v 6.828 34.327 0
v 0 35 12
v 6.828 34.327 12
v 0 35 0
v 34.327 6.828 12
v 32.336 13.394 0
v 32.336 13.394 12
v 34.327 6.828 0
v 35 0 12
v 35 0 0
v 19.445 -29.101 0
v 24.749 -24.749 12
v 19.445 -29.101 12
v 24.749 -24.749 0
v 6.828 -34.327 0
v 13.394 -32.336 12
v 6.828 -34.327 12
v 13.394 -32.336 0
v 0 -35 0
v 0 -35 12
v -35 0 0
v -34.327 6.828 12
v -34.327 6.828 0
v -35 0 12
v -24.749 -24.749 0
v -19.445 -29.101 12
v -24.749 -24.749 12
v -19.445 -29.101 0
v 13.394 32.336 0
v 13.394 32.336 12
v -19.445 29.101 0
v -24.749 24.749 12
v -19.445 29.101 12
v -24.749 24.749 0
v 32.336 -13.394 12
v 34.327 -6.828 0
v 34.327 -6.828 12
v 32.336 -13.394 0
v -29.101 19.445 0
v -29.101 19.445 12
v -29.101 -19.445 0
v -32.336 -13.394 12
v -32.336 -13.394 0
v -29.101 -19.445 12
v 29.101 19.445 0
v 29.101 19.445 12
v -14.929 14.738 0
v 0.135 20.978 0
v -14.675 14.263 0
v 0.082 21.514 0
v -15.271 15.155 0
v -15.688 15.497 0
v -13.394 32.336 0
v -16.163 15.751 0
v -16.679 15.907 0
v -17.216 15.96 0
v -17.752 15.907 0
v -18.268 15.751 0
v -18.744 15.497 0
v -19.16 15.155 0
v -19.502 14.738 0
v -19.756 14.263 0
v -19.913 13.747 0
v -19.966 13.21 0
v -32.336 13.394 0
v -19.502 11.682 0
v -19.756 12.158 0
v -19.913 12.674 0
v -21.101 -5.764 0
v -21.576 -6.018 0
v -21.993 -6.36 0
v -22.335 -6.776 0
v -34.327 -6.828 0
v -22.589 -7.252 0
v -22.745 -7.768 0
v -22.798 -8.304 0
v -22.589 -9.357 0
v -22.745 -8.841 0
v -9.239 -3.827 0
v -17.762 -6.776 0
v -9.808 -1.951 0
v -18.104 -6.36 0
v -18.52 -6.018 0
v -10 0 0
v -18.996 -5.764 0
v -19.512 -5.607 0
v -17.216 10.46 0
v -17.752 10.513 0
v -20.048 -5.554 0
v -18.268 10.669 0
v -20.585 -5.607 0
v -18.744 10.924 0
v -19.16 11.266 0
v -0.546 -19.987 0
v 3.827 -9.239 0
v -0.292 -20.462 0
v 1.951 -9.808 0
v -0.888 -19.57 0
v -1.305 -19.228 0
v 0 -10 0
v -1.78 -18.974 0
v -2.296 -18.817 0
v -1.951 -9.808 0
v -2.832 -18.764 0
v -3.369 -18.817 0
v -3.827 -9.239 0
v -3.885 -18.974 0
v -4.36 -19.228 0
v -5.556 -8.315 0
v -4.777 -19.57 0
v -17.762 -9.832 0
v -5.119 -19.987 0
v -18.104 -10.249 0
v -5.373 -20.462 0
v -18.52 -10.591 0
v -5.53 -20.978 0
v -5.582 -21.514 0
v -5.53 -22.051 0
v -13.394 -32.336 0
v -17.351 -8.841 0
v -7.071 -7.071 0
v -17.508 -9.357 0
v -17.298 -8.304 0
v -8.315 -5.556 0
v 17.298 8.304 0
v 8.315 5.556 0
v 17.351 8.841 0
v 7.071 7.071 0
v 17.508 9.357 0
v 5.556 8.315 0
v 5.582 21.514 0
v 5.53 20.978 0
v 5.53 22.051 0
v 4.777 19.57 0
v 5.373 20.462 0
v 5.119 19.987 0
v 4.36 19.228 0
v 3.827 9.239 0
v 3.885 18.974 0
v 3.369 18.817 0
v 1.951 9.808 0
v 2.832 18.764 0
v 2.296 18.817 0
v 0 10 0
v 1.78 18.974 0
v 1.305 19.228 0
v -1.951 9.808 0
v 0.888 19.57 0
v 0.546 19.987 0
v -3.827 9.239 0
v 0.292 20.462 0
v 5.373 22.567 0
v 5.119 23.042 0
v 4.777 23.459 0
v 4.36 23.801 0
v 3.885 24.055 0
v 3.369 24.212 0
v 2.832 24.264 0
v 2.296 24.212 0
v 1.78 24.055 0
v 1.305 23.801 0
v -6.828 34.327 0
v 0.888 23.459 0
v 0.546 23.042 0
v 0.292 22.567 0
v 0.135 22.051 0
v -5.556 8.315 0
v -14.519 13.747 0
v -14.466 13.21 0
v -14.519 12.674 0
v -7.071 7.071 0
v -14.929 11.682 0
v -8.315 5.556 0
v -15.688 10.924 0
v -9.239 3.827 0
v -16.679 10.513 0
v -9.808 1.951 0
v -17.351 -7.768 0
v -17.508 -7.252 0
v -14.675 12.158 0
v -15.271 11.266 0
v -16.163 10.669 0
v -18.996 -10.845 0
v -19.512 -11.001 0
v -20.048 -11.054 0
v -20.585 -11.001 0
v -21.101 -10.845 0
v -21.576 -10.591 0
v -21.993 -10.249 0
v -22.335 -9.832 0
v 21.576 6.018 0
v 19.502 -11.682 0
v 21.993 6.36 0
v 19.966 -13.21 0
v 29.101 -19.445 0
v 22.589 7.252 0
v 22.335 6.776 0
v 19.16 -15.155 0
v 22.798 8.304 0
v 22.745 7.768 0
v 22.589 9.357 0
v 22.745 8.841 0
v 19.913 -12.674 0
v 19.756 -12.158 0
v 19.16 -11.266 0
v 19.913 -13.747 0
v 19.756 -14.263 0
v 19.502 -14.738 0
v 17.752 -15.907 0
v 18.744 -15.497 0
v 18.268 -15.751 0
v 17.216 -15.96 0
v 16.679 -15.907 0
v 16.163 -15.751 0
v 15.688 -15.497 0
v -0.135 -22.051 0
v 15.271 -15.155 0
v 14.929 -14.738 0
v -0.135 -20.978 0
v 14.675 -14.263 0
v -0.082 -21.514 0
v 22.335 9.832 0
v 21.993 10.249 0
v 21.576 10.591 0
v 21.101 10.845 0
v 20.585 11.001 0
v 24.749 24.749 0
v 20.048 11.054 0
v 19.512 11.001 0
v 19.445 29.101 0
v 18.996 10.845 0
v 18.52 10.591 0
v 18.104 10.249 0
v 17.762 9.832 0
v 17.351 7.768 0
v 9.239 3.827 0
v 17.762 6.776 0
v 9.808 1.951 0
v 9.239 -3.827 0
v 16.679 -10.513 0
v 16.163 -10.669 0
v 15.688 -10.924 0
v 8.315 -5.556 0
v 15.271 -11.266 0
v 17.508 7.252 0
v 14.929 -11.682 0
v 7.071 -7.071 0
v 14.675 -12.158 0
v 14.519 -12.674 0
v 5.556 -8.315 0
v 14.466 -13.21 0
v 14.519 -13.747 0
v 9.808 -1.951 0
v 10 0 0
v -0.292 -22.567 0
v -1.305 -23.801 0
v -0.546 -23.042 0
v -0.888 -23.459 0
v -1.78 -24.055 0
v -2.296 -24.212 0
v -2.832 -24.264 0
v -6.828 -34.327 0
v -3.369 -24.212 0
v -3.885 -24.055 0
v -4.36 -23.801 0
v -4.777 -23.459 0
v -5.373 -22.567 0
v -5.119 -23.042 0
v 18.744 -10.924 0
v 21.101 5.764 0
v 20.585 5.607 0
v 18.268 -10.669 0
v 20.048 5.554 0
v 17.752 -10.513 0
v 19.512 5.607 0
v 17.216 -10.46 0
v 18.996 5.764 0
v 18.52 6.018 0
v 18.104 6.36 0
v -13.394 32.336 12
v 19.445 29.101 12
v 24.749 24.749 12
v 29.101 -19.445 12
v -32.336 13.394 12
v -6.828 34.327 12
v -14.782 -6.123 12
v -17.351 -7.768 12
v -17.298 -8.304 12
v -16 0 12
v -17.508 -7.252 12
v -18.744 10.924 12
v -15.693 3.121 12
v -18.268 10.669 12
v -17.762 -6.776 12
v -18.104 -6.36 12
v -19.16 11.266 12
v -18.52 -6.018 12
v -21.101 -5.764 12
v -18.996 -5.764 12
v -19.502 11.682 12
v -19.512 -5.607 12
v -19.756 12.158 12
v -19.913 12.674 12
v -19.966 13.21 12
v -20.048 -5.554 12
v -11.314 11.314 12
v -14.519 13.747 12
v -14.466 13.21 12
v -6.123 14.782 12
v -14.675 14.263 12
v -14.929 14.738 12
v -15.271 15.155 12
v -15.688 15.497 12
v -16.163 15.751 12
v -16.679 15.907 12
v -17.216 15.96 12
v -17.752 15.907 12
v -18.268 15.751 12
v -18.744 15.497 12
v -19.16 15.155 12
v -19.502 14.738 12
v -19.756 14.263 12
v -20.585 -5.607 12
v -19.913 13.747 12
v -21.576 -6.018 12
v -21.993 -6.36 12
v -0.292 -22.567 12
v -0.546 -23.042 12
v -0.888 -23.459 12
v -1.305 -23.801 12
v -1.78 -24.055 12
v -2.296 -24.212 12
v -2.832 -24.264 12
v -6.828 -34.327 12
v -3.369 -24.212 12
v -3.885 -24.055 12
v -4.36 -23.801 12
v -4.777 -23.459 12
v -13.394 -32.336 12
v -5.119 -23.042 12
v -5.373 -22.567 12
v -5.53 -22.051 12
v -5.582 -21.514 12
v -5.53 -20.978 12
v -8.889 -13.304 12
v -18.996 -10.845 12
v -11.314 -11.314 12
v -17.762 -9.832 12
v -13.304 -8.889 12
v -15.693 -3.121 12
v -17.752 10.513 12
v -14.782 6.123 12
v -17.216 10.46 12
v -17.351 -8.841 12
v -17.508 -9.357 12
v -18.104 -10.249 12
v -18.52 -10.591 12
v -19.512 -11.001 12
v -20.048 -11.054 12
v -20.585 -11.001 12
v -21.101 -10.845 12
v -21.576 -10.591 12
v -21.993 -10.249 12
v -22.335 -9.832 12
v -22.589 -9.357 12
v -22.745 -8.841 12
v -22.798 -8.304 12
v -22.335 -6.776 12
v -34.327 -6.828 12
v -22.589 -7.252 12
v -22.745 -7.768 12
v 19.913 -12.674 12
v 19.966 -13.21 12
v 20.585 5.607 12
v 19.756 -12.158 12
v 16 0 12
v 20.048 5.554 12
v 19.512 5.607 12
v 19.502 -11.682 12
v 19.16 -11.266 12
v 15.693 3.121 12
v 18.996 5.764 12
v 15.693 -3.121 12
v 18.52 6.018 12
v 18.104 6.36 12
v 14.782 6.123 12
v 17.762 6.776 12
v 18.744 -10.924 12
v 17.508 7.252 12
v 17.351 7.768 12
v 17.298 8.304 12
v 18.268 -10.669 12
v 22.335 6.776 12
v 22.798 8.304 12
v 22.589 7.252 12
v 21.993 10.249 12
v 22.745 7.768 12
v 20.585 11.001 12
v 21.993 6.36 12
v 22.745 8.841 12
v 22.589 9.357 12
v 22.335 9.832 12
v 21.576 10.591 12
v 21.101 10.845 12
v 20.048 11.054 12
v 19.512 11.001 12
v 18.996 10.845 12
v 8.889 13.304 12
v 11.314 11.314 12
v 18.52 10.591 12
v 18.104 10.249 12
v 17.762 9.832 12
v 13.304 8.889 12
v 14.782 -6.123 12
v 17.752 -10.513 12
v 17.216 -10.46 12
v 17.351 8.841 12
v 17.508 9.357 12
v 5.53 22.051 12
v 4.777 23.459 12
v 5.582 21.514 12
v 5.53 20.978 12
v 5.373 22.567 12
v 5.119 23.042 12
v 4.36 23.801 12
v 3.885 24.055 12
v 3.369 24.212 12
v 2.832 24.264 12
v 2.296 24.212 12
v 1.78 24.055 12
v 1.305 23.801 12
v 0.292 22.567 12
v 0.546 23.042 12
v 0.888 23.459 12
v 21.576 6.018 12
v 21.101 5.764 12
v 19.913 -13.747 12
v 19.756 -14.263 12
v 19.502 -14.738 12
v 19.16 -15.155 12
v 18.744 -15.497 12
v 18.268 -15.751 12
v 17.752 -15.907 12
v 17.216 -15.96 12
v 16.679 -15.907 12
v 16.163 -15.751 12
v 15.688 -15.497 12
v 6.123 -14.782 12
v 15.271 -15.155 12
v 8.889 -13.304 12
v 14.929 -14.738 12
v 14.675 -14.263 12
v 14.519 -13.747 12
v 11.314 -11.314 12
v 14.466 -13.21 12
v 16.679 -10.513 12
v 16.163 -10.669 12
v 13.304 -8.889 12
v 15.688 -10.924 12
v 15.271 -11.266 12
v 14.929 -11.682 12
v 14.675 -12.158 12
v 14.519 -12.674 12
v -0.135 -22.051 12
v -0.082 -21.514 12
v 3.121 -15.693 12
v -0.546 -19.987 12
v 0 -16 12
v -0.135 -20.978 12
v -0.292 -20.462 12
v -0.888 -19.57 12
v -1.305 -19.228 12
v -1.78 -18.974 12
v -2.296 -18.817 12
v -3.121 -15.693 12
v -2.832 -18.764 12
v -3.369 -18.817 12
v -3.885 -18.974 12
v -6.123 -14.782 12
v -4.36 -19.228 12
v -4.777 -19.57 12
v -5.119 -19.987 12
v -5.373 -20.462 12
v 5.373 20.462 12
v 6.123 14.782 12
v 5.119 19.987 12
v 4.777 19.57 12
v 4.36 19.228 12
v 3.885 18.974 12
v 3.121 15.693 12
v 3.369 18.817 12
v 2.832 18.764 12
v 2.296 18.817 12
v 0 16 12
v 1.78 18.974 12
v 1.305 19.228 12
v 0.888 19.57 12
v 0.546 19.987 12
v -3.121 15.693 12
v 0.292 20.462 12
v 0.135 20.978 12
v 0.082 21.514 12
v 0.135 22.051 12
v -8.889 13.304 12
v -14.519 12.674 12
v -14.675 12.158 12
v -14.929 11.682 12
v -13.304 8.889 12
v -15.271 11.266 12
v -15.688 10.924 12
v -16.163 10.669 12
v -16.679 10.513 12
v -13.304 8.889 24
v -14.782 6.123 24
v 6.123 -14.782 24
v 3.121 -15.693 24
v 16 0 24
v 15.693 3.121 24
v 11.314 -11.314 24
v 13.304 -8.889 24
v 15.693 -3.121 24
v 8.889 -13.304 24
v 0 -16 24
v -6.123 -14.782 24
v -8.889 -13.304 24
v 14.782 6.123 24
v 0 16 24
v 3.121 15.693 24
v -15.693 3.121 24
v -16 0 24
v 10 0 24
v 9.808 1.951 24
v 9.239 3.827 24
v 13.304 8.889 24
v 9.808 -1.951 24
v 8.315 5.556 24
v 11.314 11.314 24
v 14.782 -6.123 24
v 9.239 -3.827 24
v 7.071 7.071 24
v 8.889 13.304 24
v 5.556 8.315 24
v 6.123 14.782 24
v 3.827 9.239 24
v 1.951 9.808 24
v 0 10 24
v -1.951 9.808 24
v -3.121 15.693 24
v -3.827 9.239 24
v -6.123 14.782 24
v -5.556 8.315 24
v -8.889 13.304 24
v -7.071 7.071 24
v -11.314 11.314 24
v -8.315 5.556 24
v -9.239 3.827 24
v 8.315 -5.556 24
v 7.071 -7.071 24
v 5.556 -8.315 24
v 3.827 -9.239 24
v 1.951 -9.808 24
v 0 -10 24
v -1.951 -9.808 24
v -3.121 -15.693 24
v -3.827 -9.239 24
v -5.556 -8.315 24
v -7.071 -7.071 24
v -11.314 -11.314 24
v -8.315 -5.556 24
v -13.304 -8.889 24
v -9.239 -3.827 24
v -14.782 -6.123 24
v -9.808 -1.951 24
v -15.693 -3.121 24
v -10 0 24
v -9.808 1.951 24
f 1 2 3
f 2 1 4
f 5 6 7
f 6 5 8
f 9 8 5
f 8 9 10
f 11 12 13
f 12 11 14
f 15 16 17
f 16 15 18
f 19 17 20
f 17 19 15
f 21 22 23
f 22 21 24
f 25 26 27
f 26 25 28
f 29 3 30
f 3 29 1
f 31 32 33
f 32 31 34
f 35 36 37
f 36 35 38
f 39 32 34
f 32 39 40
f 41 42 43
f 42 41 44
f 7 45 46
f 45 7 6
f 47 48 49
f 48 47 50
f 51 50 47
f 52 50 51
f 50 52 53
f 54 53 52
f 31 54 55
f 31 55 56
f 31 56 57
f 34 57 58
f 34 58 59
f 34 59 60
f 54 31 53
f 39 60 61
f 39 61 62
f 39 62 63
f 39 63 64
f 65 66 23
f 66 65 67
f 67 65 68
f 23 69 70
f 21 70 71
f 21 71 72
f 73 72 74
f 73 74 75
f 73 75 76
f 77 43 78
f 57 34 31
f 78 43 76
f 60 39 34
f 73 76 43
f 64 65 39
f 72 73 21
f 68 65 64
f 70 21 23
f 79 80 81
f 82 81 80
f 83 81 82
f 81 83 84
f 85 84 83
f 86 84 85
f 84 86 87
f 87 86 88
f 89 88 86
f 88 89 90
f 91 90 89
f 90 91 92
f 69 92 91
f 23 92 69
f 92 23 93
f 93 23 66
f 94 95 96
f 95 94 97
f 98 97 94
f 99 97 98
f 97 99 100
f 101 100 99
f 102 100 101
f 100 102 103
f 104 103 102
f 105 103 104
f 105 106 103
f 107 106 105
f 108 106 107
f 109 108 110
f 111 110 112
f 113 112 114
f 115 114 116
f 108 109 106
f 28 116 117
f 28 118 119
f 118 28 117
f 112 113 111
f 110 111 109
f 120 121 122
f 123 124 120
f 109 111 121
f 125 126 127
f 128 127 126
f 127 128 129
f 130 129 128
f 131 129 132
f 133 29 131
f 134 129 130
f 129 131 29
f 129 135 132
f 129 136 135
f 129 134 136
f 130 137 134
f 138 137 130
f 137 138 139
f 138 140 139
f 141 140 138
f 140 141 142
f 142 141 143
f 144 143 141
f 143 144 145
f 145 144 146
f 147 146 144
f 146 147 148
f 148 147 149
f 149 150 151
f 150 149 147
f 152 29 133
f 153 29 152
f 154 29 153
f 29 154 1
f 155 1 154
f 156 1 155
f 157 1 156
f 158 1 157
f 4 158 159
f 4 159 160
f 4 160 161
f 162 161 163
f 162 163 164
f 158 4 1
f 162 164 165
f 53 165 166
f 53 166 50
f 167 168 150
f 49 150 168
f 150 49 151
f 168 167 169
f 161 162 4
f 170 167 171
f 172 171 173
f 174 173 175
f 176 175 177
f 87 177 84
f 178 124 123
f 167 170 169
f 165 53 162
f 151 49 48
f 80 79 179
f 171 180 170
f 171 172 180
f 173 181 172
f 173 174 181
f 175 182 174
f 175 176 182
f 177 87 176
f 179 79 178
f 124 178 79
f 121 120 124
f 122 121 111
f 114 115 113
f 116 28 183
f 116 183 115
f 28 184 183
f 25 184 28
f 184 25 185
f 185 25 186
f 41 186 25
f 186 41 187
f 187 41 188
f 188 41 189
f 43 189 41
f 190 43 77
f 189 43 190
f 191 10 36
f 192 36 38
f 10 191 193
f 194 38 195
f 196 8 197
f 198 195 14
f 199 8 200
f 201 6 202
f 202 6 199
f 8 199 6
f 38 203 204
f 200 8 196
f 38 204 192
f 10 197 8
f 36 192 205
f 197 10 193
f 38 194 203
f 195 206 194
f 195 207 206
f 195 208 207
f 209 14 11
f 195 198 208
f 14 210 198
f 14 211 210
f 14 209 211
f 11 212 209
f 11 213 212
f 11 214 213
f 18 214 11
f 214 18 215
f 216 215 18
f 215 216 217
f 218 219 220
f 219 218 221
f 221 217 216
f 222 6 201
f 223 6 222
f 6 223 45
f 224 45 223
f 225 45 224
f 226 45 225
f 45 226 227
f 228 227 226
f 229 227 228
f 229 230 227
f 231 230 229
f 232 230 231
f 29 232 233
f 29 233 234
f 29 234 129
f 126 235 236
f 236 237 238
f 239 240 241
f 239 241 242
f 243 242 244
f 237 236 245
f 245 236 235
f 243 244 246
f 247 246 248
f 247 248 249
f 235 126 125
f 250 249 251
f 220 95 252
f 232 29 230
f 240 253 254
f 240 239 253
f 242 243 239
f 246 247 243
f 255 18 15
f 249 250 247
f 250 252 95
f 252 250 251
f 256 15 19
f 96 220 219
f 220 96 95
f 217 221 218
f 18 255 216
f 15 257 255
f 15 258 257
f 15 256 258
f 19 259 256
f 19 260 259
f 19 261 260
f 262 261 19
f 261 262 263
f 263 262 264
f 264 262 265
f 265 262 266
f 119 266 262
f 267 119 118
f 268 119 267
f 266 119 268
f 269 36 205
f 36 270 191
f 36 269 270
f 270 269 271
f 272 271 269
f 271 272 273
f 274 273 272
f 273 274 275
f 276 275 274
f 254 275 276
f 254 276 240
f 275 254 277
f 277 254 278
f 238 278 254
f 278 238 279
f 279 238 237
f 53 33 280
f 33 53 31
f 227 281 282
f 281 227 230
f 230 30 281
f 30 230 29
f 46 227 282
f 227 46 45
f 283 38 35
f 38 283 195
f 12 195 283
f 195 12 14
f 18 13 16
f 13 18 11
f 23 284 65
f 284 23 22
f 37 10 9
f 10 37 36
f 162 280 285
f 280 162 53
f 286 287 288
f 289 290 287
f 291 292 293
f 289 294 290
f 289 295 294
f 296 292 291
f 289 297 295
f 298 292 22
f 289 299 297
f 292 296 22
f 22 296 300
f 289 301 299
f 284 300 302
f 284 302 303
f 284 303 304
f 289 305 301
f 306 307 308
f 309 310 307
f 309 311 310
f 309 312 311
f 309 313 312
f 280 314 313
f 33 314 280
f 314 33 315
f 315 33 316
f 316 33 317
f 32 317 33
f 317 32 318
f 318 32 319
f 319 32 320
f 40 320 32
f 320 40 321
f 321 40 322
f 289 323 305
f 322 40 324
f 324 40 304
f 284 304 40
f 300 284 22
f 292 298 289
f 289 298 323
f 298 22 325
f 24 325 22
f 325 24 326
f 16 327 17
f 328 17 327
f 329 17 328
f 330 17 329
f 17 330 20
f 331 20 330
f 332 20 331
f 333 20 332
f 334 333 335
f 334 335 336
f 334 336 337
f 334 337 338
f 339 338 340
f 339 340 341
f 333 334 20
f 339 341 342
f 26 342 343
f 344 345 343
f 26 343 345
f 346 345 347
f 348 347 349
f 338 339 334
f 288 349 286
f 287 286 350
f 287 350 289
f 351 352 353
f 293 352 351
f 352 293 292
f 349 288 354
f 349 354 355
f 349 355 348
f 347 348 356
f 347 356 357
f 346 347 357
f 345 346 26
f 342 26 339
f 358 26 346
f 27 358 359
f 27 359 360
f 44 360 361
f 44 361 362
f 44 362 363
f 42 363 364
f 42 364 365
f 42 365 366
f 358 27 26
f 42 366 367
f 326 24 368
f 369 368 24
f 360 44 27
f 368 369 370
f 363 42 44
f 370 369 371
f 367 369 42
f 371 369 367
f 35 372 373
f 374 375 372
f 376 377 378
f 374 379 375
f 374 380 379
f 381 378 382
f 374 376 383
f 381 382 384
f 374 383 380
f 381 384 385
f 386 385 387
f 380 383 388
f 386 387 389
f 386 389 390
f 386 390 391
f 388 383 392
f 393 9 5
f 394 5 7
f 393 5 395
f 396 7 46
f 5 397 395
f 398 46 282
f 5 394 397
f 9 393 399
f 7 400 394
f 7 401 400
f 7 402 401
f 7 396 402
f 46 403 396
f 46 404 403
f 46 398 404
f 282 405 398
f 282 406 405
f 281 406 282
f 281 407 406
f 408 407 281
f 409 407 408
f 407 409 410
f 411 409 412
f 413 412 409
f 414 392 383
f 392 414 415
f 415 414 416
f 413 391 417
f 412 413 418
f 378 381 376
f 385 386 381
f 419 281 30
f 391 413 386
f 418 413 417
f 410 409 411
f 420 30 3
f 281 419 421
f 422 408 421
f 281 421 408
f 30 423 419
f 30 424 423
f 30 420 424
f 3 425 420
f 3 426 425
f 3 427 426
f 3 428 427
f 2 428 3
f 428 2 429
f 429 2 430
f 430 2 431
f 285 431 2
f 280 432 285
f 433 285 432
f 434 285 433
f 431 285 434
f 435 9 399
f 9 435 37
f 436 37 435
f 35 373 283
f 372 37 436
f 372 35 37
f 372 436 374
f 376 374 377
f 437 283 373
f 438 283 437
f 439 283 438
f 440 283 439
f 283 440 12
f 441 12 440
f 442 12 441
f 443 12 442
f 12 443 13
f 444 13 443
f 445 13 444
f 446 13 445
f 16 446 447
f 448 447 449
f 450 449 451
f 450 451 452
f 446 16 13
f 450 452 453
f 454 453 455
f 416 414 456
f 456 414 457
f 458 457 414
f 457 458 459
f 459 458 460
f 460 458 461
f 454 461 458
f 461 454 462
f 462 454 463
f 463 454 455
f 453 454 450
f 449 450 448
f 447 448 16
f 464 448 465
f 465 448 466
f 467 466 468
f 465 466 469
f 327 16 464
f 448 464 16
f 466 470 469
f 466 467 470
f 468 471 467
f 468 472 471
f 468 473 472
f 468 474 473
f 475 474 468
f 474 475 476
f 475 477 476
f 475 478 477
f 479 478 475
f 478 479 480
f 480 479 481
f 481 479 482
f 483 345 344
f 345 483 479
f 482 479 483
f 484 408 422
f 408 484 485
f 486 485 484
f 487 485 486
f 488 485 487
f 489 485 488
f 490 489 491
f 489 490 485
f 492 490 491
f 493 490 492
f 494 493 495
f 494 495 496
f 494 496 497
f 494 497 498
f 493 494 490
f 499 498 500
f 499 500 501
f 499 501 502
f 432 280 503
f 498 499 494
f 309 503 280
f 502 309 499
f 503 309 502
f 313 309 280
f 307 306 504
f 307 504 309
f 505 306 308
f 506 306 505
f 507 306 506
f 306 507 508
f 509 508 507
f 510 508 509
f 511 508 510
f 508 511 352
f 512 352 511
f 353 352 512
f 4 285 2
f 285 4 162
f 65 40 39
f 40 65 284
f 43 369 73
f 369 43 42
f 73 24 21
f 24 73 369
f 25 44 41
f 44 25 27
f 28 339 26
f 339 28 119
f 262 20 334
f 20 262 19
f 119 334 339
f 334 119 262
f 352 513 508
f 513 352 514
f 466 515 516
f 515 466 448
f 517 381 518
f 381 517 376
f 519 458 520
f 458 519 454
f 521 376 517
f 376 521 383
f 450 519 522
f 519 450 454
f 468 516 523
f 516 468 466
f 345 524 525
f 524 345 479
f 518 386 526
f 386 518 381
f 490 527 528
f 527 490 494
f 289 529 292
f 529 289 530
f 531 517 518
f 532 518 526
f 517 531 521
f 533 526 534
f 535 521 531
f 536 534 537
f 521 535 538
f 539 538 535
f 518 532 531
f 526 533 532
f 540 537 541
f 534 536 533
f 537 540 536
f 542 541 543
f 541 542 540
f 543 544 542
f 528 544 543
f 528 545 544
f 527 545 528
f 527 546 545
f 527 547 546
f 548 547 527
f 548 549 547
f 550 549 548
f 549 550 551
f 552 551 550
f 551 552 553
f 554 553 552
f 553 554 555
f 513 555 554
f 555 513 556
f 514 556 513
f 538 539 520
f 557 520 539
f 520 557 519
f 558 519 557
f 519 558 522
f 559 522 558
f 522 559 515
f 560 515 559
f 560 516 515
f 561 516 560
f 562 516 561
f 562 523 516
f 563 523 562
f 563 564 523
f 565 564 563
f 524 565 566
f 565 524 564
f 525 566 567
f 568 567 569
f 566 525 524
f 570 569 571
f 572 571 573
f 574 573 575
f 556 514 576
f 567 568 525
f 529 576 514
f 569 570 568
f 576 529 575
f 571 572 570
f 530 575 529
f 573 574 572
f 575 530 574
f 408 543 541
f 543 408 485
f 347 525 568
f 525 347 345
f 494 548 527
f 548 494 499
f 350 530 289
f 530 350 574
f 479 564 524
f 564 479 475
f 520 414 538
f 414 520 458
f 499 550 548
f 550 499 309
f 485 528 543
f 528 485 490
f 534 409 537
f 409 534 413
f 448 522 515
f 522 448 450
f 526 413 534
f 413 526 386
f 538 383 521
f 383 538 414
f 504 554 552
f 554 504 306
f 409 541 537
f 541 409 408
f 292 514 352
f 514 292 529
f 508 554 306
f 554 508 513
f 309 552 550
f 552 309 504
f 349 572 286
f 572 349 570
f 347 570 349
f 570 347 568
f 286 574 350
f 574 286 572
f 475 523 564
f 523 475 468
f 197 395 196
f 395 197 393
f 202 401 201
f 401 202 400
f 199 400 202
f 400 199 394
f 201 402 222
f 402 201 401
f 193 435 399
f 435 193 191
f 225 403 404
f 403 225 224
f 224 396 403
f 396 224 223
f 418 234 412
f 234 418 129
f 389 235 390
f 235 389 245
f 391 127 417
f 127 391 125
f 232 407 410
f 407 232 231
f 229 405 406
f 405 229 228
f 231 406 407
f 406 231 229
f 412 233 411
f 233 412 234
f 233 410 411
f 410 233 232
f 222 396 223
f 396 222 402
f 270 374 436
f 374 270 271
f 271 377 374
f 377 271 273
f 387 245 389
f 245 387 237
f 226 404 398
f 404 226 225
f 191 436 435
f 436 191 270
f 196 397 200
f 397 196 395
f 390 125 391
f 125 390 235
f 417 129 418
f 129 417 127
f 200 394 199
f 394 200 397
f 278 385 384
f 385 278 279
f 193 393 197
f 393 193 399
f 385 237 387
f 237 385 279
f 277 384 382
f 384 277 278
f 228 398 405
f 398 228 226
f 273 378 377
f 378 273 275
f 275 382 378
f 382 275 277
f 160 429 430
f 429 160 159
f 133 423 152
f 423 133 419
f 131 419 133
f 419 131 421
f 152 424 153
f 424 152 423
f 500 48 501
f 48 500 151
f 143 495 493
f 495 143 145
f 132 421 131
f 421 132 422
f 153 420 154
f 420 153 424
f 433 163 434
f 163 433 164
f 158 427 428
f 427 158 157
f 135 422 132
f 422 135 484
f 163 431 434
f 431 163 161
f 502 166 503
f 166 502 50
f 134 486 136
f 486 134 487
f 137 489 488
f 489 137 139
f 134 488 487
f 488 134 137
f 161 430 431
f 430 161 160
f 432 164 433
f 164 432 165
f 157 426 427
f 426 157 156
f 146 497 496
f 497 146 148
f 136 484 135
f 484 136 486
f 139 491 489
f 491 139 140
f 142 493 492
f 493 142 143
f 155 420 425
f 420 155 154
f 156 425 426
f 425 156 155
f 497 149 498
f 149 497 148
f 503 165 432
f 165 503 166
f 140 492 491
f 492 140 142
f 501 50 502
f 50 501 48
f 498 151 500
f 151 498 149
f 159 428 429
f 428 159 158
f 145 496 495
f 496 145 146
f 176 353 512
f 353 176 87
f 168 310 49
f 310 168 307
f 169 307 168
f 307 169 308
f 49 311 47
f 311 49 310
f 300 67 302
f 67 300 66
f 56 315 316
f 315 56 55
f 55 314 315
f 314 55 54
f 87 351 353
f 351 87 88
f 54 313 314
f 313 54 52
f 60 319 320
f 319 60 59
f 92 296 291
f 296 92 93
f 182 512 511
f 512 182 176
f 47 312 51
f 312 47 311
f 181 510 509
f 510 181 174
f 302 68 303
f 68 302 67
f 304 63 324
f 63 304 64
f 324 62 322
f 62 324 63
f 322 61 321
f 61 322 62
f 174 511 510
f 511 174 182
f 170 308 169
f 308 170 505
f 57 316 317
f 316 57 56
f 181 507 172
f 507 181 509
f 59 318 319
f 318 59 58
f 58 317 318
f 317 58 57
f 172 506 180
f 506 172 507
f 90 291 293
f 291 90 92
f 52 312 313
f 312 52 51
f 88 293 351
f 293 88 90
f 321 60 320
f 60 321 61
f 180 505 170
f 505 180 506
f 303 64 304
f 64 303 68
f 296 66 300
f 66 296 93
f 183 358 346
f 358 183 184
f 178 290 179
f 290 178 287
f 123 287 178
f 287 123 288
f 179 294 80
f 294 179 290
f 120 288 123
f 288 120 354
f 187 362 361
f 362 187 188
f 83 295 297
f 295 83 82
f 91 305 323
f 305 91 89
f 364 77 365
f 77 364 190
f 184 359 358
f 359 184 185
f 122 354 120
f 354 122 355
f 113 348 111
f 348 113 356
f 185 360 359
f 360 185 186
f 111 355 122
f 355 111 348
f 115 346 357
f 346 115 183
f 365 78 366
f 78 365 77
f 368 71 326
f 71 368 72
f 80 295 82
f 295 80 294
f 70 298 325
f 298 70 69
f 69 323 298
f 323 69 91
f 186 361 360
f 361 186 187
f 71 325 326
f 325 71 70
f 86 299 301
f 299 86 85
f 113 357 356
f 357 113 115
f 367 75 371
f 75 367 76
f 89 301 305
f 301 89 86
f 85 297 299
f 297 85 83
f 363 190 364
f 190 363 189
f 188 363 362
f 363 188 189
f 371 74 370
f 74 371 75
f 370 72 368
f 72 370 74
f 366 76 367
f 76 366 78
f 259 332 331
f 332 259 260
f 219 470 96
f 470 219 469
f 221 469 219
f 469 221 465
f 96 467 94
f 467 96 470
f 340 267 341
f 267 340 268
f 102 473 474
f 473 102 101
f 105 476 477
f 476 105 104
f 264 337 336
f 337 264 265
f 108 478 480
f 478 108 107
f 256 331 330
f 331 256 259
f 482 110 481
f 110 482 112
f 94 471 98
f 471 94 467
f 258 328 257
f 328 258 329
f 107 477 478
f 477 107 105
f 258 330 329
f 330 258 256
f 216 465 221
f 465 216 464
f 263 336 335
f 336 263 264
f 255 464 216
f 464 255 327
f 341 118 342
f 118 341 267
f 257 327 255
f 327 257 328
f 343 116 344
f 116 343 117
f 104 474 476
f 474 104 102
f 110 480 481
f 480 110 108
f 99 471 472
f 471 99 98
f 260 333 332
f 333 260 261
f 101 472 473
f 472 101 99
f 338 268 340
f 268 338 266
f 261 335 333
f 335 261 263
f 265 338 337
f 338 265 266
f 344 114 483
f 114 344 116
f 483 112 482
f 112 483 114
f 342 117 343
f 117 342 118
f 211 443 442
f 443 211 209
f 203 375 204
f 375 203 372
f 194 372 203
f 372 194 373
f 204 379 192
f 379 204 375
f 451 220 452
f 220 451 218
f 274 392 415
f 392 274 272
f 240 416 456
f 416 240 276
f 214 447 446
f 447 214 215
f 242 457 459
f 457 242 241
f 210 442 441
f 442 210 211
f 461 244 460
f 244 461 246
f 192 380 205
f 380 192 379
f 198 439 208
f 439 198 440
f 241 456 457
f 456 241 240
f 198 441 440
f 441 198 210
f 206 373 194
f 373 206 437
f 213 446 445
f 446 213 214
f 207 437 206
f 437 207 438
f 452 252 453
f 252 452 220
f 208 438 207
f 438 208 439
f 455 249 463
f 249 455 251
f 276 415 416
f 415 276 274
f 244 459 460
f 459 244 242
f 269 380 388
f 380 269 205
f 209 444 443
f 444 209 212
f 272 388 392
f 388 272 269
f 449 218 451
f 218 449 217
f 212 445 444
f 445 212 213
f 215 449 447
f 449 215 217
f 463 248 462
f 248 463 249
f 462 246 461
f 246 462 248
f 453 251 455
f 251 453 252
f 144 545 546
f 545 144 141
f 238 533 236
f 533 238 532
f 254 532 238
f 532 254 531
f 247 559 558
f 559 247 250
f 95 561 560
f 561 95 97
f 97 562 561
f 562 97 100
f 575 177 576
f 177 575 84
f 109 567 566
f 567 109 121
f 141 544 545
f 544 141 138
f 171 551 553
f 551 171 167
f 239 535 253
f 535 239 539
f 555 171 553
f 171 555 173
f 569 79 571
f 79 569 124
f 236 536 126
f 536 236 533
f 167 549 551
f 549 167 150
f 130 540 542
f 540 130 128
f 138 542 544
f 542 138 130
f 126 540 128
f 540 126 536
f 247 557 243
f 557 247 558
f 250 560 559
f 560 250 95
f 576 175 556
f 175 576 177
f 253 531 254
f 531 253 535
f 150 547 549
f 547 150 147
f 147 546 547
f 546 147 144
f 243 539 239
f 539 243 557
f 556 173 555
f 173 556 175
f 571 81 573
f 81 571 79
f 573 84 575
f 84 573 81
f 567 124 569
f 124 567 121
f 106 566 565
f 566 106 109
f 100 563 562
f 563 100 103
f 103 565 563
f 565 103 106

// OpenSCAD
$fn = 32;

// ----------------------------------------------------------------------
// Flange Ø70 x 12
// 6 holes on a Ø43.4 bolt circle, bolted joints
// ----------------------------------------------------------------------

// --- parameters (mm) ---
flange_d = 70;     // outside diameter of the flange
thickness = 12;    // flange thickness
holes = 6;         // number of bolt holes
pcd = 43.4;        // bolt circle diameter
start_deg = 22.5;  // angle of the first hole, from +X
hole_d = 5.5;      // bolt hole diameter
bore_d = 20;       // central through bore
hub_d = 32;        // hub outside diameter
hub_h = 12;        // hub height above the flange face (0 = no hub)

// --- derived feature positions (mm) ---
height = thickness + hub_h;  // = 24   overall height of the part
pcd_r = pcd / 2;             // = 21.7   bolt circle radius
hole_step = 360 / holes;     // = 60   angular pitch
feature_centers = [
  [pcd_r * cos(start_deg + 0 * hole_step), pcd_r * sin(start_deg + 0 * hole_step)],
  [pcd_r * cos(start_deg + 1 * hole_step), pcd_r * sin(start_deg + 1 * hole_step)],
  [pcd_r * cos(start_deg + 2 * hole_step), pcd_r * sin(start_deg + 2 * hole_step)],
  [pcd_r * cos(start_deg + 3 * hole_step), pcd_r * sin(start_deg + 3 * hole_step)],
  [pcd_r * cos(start_deg + 4 * hole_step), pcd_r * sin(start_deg + 4 * hole_step)],
  [pcd_r * cos(start_deg + 5 * hole_step), pcd_r * sin(start_deg + 5 * hole_step)]
];   // bolt hole centres on the pitch circle

// flange disc, every hole and the bore cut straight through
difference() {
  union() {
    cylinder(d = flange_d, h = thickness);
    cylinder(d = hub_d, h = height);  // hub, overlapped into the flange
  }
  translate([0, 0, -1]) cylinder(d = bore_d, h = height + 2);  // bore, through
  for (centre = feature_centers)
    translate([centre[0], centre[1], -1]) cylinder(d = hole_d, h = thickness + 2);
}
